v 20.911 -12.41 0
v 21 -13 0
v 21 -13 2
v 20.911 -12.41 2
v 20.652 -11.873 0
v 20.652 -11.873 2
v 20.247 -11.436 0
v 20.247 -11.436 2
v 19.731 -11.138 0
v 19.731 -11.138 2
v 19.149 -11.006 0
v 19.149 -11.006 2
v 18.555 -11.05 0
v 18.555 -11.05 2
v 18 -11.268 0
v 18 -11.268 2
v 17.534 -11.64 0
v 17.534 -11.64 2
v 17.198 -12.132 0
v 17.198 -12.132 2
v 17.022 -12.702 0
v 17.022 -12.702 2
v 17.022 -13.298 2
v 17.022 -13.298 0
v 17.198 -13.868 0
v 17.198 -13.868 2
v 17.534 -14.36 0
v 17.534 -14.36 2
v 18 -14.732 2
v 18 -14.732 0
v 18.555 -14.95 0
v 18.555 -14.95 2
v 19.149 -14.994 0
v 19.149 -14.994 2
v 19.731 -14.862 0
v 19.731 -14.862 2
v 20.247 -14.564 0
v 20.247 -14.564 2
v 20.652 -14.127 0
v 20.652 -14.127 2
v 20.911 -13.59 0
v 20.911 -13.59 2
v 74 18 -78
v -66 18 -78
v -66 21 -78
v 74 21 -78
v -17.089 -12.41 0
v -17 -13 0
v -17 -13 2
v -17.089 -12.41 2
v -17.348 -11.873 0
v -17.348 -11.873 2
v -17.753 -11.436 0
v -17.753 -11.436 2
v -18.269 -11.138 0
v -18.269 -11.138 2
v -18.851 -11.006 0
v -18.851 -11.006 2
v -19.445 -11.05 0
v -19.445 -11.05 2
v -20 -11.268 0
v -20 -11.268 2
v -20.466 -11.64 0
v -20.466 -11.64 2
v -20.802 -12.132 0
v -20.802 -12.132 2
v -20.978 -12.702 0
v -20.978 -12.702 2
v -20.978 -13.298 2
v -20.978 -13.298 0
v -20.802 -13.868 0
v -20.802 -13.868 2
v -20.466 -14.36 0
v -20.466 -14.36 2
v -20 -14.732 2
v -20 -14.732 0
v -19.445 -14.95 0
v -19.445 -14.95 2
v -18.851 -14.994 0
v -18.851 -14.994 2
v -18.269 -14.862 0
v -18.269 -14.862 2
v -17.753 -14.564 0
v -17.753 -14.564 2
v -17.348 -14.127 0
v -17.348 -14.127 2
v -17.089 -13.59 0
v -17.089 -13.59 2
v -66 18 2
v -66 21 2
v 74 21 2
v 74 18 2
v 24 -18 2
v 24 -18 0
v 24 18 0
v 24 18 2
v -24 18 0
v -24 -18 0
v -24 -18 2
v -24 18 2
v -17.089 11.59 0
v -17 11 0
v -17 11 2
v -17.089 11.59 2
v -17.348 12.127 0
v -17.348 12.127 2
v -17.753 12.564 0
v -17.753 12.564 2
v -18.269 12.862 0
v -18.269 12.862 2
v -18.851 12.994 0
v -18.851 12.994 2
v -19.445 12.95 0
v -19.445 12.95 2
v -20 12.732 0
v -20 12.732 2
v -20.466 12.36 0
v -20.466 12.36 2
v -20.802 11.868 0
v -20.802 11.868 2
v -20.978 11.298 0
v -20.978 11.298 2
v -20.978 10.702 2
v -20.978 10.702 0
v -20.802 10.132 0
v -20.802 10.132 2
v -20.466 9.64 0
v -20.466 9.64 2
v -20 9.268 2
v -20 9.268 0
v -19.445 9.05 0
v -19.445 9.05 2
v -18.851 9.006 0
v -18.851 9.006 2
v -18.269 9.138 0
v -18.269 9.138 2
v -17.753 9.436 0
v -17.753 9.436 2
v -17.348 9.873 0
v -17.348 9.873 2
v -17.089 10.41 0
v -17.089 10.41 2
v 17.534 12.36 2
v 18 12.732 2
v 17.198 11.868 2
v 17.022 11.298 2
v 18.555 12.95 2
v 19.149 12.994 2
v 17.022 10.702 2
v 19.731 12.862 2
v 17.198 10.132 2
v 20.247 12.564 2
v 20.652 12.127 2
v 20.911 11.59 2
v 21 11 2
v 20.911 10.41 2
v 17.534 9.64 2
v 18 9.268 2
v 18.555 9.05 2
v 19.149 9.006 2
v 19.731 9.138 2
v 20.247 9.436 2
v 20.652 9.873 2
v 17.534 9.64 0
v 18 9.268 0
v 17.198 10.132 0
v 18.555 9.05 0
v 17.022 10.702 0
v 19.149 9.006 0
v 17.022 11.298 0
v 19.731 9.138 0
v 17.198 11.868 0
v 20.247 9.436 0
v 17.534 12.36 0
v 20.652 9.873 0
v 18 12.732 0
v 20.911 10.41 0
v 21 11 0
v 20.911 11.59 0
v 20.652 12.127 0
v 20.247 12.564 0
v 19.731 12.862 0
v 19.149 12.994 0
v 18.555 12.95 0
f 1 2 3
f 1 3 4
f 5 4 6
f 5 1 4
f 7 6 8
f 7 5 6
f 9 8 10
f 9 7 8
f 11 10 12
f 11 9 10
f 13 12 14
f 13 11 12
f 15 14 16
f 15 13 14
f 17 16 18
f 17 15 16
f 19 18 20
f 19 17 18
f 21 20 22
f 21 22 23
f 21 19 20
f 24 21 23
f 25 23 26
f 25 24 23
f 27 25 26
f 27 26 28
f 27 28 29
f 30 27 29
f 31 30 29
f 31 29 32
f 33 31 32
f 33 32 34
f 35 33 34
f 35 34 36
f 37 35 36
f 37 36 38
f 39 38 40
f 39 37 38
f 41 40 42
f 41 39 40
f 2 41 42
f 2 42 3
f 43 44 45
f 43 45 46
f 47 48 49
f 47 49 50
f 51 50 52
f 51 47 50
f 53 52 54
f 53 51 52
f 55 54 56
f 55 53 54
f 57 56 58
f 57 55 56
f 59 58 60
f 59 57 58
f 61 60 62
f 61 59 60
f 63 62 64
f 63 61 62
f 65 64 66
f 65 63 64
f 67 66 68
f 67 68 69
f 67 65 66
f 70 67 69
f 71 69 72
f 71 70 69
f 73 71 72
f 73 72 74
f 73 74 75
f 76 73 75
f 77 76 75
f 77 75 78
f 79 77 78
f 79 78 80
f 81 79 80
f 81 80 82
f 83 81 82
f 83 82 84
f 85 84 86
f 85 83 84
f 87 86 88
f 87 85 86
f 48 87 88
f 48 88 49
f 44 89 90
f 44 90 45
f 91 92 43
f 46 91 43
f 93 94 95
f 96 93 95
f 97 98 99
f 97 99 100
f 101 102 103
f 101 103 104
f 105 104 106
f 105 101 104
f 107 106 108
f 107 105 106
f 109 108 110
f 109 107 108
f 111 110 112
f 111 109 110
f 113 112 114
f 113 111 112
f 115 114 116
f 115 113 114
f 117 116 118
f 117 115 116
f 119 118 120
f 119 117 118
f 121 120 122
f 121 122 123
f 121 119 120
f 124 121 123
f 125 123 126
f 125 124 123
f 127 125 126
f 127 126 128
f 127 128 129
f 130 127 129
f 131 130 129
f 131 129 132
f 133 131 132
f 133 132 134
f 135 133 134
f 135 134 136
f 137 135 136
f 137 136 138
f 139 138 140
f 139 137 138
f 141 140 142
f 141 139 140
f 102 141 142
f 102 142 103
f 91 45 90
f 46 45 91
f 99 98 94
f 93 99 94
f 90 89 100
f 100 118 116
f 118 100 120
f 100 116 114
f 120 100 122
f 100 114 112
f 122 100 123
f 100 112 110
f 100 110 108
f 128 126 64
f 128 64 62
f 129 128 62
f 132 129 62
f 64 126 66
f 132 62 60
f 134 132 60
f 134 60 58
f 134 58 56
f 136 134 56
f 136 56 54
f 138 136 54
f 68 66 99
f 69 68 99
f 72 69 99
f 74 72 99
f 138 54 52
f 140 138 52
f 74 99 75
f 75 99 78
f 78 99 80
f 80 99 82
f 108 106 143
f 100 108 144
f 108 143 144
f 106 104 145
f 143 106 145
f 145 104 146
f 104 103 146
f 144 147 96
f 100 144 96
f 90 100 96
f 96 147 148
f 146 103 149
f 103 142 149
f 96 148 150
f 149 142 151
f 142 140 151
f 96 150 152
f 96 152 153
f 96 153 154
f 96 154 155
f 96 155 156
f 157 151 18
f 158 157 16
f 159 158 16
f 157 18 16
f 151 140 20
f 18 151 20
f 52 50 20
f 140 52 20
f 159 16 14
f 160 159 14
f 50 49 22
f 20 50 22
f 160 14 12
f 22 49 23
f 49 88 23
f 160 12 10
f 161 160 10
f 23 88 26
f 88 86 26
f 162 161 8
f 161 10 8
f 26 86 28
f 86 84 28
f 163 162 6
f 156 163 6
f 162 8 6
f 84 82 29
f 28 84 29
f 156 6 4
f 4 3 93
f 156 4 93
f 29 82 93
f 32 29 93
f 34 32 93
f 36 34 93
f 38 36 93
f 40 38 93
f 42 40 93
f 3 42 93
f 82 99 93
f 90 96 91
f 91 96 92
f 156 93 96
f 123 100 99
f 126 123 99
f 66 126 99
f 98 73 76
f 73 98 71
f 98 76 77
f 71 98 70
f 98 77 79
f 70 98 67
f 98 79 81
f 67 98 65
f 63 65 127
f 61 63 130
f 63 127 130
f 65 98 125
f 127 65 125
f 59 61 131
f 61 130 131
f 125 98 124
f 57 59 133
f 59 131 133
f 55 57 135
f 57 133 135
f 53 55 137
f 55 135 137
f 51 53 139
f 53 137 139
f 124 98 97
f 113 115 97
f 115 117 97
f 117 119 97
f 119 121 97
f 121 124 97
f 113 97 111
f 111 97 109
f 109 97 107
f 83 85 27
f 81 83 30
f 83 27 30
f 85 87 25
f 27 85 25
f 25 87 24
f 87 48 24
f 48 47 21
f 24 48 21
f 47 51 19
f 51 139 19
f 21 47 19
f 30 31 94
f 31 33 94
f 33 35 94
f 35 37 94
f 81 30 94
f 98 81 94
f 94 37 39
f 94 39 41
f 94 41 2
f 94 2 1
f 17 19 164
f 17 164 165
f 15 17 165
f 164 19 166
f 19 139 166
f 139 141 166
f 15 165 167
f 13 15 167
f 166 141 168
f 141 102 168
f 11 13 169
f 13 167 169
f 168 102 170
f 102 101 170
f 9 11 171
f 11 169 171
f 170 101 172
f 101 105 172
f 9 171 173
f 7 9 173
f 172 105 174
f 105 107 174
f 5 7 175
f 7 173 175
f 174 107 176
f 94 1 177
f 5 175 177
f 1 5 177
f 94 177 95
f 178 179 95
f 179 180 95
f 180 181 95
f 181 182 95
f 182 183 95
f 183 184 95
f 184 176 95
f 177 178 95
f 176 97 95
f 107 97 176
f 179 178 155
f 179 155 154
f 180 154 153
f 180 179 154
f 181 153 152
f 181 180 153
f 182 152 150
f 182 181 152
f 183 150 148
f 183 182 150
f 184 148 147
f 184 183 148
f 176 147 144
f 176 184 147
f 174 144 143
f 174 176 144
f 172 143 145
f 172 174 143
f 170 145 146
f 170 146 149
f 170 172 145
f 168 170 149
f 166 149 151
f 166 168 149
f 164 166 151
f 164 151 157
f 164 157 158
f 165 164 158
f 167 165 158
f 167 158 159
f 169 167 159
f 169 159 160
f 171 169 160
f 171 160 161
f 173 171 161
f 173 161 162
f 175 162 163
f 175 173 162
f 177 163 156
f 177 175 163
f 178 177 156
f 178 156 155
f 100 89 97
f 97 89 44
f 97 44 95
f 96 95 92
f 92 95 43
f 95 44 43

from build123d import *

# Parameters (mm, degrees)
SKETCH1_W           = 48
SKETCH1_H           = 36
SKETCH1_R           = 2
BOSS_EXTRUDE1_DEPTH = 2
SKETCH2_W           = 140
SKETCH2_H           = 80
BOSS_EXTRUDE2_DEPTH = 3


with BuildPart() as part:
    # Sketch1 → Boss-Extrude1 (new body)
    with BuildSketch(Plane.XY):
        Rectangle(SKETCH1_W, SKETCH1_H)
        with Locations((-19, 11)):
            Circle(SKETCH1_R, mode=Mode.SUBTRACT)
        with Locations((-19, -13)):
            Circle(SKETCH1_R, mode=Mode.SUBTRACT)
        with Locations((19, -13)):
            Circle(SKETCH1_R, mode=Mode.SUBTRACT)
        with Locations((19, 11)):
            Circle(SKETCH1_R, mode=Mode.SUBTRACT)
    extrude(amount=BOSS_EXTRUDE1_DEPTH)

    # Sketch2 → Boss-Extrude2 (add)
    with BuildSketch(Plane(origin=(0, 18, 0), x_dir=(1, 0, 0), z_dir=(0, 1, 0))):
        with Locations((4, 38)):
            Rectangle(SKETCH2_W, SKETCH2_H)
    extrude(amount=BOSS_EXTRUDE2_DEPTH)


solid = part.part
